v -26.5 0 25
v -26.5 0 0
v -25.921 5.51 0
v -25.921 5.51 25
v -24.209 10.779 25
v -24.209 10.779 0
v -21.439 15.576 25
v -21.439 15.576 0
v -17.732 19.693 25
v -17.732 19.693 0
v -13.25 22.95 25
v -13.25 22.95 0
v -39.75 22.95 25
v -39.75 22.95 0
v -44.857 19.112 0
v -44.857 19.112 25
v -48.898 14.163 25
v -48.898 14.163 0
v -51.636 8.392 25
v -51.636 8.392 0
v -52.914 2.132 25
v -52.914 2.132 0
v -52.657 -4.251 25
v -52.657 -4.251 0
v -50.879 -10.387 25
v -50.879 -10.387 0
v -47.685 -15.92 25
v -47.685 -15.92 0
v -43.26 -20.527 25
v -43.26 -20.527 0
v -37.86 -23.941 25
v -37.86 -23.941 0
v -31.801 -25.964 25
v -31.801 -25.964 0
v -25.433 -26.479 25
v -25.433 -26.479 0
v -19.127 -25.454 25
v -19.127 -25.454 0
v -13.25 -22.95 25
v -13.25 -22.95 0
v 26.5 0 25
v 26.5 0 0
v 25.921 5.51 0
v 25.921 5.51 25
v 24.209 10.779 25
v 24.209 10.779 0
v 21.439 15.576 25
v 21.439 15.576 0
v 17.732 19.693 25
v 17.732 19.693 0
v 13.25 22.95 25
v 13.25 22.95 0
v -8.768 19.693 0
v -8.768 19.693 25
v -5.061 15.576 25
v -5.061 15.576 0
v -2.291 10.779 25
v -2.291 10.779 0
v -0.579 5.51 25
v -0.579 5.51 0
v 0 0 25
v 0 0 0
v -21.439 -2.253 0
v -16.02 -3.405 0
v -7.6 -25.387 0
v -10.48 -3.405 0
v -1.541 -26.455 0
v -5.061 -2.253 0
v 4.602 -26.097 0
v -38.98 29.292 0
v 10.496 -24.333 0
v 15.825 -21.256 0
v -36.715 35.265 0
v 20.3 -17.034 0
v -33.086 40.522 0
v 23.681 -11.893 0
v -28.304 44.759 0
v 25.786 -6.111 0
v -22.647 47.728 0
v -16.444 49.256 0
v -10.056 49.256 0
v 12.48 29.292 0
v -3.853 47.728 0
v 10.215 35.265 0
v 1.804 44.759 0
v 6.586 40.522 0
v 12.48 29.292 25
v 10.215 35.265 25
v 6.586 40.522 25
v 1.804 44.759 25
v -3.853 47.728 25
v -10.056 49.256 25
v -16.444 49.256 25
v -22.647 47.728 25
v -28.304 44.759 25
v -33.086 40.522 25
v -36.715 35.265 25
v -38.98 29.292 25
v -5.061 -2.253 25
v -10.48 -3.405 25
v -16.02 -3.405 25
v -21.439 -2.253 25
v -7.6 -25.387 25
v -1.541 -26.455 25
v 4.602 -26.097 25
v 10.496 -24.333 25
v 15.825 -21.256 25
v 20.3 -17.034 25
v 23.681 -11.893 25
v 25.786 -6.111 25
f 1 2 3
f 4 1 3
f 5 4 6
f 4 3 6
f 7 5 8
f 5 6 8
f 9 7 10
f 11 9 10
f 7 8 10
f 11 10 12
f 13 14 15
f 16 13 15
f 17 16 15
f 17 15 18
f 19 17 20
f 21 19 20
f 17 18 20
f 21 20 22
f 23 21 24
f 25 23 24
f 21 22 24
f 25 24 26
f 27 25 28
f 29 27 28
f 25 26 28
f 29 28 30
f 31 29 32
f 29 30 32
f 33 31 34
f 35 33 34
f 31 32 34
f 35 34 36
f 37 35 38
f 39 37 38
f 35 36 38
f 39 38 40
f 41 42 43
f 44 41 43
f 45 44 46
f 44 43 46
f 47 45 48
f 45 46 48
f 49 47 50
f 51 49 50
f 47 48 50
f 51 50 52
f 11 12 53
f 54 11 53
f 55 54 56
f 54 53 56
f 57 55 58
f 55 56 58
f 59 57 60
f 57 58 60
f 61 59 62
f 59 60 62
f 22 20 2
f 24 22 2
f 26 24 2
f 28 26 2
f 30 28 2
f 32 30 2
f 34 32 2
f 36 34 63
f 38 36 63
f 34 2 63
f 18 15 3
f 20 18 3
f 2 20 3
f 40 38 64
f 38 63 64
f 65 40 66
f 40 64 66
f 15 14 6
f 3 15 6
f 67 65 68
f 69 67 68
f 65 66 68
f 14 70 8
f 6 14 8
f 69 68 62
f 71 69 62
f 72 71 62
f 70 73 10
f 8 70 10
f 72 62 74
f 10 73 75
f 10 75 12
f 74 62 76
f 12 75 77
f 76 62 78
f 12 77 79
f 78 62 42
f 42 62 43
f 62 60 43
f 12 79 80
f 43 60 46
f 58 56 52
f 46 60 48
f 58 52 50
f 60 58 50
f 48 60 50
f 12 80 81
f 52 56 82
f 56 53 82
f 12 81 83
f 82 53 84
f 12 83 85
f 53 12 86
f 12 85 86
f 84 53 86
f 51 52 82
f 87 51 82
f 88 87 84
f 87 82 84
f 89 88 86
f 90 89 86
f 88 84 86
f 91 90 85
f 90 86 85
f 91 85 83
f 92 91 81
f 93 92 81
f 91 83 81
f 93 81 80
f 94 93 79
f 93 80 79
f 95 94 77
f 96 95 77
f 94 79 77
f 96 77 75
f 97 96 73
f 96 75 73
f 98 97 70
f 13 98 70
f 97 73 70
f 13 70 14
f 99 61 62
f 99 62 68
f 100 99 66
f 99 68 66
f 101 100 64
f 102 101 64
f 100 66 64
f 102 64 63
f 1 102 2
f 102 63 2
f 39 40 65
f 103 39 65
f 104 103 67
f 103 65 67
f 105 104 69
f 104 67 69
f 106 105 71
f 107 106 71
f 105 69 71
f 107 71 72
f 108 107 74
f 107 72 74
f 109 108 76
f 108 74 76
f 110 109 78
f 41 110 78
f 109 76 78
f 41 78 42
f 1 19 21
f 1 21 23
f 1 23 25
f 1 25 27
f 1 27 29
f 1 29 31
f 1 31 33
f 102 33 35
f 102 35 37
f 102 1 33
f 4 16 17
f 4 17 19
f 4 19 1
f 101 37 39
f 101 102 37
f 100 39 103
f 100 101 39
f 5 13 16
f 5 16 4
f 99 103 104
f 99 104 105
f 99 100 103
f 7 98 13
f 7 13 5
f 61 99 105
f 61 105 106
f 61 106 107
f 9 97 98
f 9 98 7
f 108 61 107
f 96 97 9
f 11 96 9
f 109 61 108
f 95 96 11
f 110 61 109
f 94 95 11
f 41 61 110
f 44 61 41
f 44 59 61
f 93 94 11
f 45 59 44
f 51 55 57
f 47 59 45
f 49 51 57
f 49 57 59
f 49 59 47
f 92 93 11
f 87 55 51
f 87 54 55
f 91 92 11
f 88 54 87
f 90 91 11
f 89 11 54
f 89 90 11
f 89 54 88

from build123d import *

# Parameters (mm, degrees)
F1_DEPTH = 25


with BuildPart() as f1:
    # F0 (on Top) → F1 (new body)
    with BuildSketch(Plane.XY):
        with BuildLine():
            ThreePointArc((-13.25, -22.9496732003), (13.25, -22.9496732003), (26.5, 0))
            ThreePointArc((26.5, 0), (22.9496732003, 13.25), (13.25, 22.9496732003))
            ThreePointArc((13.25, 22.9496732003), (9.6996732003, 9.6996732003), (0, 0))
            ThreePointArc((0, 0), (-3.5503267997, -13.25), (-13.25, -22.9496732003))
        make_face()
        with BuildLine():
            ThreePointArc((0, 0), (9.6996732003, 9.6996732003), (13.25, 22.9496732003))
            ThreePointArc((13.25, 22.9496732003), (0, 26.5), (-13.25, 22.9496732003))
            ThreePointArc((-13.25, 22.9496732003), (-3.5503267997, 13.25), (0, 0))
        make_face()
        with BuildLine():
            ThreePointArc((-13.25, 22.9496732003), (0, 26.5), (13.25, 22.9496732003))
            ThreePointArc((13.25, 22.9496732003), (-13.25, 49.4496732003), (-39.75, 22.9496732003))
            ThreePointArc((-39.75, 22.9496732003), (-26.5, 26.5), (-13.25, 22.9496732003))
        make_face()
        with BuildLine():
            ThreePointArc((-39.75, 22.9496732003), (-49.4496732003, -13.25), (-13.25, -22.9496732003))
            ThreePointArc((-13.25, -22.9496732003), (-22.9496732003, -13.25), (-26.5, 0))
            ThreePointArc((-26.5, 0), (-36.1996732003, 9.6996732003), (-39.75, 22.9496732003))
        make_face()
        with BuildLine():
            ThreePointArc((-26.5, 0), (-22.9496732003, -13.25), (-13.25, -22.9496732003))
            ThreePointArc((-13.25, -22.9496732003), (-3.5503267997, -13.25), (0, 0))
            ThreePointArc((0, 0), (-13.25, -3.5503267997), (-26.5, 0))
        make_face()
        with BuildLine():
            ThreePointArc((-26.5, 0), (-22.9496732003, 13.25), (-13.25, 22.9496732003))
            ThreePointArc((-13.25, 22.9496732003), (-26.5, 26.5), (-39.75, 22.9496732003))
            ThreePointArc((-39.75, 22.9496732003), (-36.1996732003, 9.6996732003), (-26.5, 0))
        make_face()
    extrude(amount=F1_DEPTH)


solid = f1.part
